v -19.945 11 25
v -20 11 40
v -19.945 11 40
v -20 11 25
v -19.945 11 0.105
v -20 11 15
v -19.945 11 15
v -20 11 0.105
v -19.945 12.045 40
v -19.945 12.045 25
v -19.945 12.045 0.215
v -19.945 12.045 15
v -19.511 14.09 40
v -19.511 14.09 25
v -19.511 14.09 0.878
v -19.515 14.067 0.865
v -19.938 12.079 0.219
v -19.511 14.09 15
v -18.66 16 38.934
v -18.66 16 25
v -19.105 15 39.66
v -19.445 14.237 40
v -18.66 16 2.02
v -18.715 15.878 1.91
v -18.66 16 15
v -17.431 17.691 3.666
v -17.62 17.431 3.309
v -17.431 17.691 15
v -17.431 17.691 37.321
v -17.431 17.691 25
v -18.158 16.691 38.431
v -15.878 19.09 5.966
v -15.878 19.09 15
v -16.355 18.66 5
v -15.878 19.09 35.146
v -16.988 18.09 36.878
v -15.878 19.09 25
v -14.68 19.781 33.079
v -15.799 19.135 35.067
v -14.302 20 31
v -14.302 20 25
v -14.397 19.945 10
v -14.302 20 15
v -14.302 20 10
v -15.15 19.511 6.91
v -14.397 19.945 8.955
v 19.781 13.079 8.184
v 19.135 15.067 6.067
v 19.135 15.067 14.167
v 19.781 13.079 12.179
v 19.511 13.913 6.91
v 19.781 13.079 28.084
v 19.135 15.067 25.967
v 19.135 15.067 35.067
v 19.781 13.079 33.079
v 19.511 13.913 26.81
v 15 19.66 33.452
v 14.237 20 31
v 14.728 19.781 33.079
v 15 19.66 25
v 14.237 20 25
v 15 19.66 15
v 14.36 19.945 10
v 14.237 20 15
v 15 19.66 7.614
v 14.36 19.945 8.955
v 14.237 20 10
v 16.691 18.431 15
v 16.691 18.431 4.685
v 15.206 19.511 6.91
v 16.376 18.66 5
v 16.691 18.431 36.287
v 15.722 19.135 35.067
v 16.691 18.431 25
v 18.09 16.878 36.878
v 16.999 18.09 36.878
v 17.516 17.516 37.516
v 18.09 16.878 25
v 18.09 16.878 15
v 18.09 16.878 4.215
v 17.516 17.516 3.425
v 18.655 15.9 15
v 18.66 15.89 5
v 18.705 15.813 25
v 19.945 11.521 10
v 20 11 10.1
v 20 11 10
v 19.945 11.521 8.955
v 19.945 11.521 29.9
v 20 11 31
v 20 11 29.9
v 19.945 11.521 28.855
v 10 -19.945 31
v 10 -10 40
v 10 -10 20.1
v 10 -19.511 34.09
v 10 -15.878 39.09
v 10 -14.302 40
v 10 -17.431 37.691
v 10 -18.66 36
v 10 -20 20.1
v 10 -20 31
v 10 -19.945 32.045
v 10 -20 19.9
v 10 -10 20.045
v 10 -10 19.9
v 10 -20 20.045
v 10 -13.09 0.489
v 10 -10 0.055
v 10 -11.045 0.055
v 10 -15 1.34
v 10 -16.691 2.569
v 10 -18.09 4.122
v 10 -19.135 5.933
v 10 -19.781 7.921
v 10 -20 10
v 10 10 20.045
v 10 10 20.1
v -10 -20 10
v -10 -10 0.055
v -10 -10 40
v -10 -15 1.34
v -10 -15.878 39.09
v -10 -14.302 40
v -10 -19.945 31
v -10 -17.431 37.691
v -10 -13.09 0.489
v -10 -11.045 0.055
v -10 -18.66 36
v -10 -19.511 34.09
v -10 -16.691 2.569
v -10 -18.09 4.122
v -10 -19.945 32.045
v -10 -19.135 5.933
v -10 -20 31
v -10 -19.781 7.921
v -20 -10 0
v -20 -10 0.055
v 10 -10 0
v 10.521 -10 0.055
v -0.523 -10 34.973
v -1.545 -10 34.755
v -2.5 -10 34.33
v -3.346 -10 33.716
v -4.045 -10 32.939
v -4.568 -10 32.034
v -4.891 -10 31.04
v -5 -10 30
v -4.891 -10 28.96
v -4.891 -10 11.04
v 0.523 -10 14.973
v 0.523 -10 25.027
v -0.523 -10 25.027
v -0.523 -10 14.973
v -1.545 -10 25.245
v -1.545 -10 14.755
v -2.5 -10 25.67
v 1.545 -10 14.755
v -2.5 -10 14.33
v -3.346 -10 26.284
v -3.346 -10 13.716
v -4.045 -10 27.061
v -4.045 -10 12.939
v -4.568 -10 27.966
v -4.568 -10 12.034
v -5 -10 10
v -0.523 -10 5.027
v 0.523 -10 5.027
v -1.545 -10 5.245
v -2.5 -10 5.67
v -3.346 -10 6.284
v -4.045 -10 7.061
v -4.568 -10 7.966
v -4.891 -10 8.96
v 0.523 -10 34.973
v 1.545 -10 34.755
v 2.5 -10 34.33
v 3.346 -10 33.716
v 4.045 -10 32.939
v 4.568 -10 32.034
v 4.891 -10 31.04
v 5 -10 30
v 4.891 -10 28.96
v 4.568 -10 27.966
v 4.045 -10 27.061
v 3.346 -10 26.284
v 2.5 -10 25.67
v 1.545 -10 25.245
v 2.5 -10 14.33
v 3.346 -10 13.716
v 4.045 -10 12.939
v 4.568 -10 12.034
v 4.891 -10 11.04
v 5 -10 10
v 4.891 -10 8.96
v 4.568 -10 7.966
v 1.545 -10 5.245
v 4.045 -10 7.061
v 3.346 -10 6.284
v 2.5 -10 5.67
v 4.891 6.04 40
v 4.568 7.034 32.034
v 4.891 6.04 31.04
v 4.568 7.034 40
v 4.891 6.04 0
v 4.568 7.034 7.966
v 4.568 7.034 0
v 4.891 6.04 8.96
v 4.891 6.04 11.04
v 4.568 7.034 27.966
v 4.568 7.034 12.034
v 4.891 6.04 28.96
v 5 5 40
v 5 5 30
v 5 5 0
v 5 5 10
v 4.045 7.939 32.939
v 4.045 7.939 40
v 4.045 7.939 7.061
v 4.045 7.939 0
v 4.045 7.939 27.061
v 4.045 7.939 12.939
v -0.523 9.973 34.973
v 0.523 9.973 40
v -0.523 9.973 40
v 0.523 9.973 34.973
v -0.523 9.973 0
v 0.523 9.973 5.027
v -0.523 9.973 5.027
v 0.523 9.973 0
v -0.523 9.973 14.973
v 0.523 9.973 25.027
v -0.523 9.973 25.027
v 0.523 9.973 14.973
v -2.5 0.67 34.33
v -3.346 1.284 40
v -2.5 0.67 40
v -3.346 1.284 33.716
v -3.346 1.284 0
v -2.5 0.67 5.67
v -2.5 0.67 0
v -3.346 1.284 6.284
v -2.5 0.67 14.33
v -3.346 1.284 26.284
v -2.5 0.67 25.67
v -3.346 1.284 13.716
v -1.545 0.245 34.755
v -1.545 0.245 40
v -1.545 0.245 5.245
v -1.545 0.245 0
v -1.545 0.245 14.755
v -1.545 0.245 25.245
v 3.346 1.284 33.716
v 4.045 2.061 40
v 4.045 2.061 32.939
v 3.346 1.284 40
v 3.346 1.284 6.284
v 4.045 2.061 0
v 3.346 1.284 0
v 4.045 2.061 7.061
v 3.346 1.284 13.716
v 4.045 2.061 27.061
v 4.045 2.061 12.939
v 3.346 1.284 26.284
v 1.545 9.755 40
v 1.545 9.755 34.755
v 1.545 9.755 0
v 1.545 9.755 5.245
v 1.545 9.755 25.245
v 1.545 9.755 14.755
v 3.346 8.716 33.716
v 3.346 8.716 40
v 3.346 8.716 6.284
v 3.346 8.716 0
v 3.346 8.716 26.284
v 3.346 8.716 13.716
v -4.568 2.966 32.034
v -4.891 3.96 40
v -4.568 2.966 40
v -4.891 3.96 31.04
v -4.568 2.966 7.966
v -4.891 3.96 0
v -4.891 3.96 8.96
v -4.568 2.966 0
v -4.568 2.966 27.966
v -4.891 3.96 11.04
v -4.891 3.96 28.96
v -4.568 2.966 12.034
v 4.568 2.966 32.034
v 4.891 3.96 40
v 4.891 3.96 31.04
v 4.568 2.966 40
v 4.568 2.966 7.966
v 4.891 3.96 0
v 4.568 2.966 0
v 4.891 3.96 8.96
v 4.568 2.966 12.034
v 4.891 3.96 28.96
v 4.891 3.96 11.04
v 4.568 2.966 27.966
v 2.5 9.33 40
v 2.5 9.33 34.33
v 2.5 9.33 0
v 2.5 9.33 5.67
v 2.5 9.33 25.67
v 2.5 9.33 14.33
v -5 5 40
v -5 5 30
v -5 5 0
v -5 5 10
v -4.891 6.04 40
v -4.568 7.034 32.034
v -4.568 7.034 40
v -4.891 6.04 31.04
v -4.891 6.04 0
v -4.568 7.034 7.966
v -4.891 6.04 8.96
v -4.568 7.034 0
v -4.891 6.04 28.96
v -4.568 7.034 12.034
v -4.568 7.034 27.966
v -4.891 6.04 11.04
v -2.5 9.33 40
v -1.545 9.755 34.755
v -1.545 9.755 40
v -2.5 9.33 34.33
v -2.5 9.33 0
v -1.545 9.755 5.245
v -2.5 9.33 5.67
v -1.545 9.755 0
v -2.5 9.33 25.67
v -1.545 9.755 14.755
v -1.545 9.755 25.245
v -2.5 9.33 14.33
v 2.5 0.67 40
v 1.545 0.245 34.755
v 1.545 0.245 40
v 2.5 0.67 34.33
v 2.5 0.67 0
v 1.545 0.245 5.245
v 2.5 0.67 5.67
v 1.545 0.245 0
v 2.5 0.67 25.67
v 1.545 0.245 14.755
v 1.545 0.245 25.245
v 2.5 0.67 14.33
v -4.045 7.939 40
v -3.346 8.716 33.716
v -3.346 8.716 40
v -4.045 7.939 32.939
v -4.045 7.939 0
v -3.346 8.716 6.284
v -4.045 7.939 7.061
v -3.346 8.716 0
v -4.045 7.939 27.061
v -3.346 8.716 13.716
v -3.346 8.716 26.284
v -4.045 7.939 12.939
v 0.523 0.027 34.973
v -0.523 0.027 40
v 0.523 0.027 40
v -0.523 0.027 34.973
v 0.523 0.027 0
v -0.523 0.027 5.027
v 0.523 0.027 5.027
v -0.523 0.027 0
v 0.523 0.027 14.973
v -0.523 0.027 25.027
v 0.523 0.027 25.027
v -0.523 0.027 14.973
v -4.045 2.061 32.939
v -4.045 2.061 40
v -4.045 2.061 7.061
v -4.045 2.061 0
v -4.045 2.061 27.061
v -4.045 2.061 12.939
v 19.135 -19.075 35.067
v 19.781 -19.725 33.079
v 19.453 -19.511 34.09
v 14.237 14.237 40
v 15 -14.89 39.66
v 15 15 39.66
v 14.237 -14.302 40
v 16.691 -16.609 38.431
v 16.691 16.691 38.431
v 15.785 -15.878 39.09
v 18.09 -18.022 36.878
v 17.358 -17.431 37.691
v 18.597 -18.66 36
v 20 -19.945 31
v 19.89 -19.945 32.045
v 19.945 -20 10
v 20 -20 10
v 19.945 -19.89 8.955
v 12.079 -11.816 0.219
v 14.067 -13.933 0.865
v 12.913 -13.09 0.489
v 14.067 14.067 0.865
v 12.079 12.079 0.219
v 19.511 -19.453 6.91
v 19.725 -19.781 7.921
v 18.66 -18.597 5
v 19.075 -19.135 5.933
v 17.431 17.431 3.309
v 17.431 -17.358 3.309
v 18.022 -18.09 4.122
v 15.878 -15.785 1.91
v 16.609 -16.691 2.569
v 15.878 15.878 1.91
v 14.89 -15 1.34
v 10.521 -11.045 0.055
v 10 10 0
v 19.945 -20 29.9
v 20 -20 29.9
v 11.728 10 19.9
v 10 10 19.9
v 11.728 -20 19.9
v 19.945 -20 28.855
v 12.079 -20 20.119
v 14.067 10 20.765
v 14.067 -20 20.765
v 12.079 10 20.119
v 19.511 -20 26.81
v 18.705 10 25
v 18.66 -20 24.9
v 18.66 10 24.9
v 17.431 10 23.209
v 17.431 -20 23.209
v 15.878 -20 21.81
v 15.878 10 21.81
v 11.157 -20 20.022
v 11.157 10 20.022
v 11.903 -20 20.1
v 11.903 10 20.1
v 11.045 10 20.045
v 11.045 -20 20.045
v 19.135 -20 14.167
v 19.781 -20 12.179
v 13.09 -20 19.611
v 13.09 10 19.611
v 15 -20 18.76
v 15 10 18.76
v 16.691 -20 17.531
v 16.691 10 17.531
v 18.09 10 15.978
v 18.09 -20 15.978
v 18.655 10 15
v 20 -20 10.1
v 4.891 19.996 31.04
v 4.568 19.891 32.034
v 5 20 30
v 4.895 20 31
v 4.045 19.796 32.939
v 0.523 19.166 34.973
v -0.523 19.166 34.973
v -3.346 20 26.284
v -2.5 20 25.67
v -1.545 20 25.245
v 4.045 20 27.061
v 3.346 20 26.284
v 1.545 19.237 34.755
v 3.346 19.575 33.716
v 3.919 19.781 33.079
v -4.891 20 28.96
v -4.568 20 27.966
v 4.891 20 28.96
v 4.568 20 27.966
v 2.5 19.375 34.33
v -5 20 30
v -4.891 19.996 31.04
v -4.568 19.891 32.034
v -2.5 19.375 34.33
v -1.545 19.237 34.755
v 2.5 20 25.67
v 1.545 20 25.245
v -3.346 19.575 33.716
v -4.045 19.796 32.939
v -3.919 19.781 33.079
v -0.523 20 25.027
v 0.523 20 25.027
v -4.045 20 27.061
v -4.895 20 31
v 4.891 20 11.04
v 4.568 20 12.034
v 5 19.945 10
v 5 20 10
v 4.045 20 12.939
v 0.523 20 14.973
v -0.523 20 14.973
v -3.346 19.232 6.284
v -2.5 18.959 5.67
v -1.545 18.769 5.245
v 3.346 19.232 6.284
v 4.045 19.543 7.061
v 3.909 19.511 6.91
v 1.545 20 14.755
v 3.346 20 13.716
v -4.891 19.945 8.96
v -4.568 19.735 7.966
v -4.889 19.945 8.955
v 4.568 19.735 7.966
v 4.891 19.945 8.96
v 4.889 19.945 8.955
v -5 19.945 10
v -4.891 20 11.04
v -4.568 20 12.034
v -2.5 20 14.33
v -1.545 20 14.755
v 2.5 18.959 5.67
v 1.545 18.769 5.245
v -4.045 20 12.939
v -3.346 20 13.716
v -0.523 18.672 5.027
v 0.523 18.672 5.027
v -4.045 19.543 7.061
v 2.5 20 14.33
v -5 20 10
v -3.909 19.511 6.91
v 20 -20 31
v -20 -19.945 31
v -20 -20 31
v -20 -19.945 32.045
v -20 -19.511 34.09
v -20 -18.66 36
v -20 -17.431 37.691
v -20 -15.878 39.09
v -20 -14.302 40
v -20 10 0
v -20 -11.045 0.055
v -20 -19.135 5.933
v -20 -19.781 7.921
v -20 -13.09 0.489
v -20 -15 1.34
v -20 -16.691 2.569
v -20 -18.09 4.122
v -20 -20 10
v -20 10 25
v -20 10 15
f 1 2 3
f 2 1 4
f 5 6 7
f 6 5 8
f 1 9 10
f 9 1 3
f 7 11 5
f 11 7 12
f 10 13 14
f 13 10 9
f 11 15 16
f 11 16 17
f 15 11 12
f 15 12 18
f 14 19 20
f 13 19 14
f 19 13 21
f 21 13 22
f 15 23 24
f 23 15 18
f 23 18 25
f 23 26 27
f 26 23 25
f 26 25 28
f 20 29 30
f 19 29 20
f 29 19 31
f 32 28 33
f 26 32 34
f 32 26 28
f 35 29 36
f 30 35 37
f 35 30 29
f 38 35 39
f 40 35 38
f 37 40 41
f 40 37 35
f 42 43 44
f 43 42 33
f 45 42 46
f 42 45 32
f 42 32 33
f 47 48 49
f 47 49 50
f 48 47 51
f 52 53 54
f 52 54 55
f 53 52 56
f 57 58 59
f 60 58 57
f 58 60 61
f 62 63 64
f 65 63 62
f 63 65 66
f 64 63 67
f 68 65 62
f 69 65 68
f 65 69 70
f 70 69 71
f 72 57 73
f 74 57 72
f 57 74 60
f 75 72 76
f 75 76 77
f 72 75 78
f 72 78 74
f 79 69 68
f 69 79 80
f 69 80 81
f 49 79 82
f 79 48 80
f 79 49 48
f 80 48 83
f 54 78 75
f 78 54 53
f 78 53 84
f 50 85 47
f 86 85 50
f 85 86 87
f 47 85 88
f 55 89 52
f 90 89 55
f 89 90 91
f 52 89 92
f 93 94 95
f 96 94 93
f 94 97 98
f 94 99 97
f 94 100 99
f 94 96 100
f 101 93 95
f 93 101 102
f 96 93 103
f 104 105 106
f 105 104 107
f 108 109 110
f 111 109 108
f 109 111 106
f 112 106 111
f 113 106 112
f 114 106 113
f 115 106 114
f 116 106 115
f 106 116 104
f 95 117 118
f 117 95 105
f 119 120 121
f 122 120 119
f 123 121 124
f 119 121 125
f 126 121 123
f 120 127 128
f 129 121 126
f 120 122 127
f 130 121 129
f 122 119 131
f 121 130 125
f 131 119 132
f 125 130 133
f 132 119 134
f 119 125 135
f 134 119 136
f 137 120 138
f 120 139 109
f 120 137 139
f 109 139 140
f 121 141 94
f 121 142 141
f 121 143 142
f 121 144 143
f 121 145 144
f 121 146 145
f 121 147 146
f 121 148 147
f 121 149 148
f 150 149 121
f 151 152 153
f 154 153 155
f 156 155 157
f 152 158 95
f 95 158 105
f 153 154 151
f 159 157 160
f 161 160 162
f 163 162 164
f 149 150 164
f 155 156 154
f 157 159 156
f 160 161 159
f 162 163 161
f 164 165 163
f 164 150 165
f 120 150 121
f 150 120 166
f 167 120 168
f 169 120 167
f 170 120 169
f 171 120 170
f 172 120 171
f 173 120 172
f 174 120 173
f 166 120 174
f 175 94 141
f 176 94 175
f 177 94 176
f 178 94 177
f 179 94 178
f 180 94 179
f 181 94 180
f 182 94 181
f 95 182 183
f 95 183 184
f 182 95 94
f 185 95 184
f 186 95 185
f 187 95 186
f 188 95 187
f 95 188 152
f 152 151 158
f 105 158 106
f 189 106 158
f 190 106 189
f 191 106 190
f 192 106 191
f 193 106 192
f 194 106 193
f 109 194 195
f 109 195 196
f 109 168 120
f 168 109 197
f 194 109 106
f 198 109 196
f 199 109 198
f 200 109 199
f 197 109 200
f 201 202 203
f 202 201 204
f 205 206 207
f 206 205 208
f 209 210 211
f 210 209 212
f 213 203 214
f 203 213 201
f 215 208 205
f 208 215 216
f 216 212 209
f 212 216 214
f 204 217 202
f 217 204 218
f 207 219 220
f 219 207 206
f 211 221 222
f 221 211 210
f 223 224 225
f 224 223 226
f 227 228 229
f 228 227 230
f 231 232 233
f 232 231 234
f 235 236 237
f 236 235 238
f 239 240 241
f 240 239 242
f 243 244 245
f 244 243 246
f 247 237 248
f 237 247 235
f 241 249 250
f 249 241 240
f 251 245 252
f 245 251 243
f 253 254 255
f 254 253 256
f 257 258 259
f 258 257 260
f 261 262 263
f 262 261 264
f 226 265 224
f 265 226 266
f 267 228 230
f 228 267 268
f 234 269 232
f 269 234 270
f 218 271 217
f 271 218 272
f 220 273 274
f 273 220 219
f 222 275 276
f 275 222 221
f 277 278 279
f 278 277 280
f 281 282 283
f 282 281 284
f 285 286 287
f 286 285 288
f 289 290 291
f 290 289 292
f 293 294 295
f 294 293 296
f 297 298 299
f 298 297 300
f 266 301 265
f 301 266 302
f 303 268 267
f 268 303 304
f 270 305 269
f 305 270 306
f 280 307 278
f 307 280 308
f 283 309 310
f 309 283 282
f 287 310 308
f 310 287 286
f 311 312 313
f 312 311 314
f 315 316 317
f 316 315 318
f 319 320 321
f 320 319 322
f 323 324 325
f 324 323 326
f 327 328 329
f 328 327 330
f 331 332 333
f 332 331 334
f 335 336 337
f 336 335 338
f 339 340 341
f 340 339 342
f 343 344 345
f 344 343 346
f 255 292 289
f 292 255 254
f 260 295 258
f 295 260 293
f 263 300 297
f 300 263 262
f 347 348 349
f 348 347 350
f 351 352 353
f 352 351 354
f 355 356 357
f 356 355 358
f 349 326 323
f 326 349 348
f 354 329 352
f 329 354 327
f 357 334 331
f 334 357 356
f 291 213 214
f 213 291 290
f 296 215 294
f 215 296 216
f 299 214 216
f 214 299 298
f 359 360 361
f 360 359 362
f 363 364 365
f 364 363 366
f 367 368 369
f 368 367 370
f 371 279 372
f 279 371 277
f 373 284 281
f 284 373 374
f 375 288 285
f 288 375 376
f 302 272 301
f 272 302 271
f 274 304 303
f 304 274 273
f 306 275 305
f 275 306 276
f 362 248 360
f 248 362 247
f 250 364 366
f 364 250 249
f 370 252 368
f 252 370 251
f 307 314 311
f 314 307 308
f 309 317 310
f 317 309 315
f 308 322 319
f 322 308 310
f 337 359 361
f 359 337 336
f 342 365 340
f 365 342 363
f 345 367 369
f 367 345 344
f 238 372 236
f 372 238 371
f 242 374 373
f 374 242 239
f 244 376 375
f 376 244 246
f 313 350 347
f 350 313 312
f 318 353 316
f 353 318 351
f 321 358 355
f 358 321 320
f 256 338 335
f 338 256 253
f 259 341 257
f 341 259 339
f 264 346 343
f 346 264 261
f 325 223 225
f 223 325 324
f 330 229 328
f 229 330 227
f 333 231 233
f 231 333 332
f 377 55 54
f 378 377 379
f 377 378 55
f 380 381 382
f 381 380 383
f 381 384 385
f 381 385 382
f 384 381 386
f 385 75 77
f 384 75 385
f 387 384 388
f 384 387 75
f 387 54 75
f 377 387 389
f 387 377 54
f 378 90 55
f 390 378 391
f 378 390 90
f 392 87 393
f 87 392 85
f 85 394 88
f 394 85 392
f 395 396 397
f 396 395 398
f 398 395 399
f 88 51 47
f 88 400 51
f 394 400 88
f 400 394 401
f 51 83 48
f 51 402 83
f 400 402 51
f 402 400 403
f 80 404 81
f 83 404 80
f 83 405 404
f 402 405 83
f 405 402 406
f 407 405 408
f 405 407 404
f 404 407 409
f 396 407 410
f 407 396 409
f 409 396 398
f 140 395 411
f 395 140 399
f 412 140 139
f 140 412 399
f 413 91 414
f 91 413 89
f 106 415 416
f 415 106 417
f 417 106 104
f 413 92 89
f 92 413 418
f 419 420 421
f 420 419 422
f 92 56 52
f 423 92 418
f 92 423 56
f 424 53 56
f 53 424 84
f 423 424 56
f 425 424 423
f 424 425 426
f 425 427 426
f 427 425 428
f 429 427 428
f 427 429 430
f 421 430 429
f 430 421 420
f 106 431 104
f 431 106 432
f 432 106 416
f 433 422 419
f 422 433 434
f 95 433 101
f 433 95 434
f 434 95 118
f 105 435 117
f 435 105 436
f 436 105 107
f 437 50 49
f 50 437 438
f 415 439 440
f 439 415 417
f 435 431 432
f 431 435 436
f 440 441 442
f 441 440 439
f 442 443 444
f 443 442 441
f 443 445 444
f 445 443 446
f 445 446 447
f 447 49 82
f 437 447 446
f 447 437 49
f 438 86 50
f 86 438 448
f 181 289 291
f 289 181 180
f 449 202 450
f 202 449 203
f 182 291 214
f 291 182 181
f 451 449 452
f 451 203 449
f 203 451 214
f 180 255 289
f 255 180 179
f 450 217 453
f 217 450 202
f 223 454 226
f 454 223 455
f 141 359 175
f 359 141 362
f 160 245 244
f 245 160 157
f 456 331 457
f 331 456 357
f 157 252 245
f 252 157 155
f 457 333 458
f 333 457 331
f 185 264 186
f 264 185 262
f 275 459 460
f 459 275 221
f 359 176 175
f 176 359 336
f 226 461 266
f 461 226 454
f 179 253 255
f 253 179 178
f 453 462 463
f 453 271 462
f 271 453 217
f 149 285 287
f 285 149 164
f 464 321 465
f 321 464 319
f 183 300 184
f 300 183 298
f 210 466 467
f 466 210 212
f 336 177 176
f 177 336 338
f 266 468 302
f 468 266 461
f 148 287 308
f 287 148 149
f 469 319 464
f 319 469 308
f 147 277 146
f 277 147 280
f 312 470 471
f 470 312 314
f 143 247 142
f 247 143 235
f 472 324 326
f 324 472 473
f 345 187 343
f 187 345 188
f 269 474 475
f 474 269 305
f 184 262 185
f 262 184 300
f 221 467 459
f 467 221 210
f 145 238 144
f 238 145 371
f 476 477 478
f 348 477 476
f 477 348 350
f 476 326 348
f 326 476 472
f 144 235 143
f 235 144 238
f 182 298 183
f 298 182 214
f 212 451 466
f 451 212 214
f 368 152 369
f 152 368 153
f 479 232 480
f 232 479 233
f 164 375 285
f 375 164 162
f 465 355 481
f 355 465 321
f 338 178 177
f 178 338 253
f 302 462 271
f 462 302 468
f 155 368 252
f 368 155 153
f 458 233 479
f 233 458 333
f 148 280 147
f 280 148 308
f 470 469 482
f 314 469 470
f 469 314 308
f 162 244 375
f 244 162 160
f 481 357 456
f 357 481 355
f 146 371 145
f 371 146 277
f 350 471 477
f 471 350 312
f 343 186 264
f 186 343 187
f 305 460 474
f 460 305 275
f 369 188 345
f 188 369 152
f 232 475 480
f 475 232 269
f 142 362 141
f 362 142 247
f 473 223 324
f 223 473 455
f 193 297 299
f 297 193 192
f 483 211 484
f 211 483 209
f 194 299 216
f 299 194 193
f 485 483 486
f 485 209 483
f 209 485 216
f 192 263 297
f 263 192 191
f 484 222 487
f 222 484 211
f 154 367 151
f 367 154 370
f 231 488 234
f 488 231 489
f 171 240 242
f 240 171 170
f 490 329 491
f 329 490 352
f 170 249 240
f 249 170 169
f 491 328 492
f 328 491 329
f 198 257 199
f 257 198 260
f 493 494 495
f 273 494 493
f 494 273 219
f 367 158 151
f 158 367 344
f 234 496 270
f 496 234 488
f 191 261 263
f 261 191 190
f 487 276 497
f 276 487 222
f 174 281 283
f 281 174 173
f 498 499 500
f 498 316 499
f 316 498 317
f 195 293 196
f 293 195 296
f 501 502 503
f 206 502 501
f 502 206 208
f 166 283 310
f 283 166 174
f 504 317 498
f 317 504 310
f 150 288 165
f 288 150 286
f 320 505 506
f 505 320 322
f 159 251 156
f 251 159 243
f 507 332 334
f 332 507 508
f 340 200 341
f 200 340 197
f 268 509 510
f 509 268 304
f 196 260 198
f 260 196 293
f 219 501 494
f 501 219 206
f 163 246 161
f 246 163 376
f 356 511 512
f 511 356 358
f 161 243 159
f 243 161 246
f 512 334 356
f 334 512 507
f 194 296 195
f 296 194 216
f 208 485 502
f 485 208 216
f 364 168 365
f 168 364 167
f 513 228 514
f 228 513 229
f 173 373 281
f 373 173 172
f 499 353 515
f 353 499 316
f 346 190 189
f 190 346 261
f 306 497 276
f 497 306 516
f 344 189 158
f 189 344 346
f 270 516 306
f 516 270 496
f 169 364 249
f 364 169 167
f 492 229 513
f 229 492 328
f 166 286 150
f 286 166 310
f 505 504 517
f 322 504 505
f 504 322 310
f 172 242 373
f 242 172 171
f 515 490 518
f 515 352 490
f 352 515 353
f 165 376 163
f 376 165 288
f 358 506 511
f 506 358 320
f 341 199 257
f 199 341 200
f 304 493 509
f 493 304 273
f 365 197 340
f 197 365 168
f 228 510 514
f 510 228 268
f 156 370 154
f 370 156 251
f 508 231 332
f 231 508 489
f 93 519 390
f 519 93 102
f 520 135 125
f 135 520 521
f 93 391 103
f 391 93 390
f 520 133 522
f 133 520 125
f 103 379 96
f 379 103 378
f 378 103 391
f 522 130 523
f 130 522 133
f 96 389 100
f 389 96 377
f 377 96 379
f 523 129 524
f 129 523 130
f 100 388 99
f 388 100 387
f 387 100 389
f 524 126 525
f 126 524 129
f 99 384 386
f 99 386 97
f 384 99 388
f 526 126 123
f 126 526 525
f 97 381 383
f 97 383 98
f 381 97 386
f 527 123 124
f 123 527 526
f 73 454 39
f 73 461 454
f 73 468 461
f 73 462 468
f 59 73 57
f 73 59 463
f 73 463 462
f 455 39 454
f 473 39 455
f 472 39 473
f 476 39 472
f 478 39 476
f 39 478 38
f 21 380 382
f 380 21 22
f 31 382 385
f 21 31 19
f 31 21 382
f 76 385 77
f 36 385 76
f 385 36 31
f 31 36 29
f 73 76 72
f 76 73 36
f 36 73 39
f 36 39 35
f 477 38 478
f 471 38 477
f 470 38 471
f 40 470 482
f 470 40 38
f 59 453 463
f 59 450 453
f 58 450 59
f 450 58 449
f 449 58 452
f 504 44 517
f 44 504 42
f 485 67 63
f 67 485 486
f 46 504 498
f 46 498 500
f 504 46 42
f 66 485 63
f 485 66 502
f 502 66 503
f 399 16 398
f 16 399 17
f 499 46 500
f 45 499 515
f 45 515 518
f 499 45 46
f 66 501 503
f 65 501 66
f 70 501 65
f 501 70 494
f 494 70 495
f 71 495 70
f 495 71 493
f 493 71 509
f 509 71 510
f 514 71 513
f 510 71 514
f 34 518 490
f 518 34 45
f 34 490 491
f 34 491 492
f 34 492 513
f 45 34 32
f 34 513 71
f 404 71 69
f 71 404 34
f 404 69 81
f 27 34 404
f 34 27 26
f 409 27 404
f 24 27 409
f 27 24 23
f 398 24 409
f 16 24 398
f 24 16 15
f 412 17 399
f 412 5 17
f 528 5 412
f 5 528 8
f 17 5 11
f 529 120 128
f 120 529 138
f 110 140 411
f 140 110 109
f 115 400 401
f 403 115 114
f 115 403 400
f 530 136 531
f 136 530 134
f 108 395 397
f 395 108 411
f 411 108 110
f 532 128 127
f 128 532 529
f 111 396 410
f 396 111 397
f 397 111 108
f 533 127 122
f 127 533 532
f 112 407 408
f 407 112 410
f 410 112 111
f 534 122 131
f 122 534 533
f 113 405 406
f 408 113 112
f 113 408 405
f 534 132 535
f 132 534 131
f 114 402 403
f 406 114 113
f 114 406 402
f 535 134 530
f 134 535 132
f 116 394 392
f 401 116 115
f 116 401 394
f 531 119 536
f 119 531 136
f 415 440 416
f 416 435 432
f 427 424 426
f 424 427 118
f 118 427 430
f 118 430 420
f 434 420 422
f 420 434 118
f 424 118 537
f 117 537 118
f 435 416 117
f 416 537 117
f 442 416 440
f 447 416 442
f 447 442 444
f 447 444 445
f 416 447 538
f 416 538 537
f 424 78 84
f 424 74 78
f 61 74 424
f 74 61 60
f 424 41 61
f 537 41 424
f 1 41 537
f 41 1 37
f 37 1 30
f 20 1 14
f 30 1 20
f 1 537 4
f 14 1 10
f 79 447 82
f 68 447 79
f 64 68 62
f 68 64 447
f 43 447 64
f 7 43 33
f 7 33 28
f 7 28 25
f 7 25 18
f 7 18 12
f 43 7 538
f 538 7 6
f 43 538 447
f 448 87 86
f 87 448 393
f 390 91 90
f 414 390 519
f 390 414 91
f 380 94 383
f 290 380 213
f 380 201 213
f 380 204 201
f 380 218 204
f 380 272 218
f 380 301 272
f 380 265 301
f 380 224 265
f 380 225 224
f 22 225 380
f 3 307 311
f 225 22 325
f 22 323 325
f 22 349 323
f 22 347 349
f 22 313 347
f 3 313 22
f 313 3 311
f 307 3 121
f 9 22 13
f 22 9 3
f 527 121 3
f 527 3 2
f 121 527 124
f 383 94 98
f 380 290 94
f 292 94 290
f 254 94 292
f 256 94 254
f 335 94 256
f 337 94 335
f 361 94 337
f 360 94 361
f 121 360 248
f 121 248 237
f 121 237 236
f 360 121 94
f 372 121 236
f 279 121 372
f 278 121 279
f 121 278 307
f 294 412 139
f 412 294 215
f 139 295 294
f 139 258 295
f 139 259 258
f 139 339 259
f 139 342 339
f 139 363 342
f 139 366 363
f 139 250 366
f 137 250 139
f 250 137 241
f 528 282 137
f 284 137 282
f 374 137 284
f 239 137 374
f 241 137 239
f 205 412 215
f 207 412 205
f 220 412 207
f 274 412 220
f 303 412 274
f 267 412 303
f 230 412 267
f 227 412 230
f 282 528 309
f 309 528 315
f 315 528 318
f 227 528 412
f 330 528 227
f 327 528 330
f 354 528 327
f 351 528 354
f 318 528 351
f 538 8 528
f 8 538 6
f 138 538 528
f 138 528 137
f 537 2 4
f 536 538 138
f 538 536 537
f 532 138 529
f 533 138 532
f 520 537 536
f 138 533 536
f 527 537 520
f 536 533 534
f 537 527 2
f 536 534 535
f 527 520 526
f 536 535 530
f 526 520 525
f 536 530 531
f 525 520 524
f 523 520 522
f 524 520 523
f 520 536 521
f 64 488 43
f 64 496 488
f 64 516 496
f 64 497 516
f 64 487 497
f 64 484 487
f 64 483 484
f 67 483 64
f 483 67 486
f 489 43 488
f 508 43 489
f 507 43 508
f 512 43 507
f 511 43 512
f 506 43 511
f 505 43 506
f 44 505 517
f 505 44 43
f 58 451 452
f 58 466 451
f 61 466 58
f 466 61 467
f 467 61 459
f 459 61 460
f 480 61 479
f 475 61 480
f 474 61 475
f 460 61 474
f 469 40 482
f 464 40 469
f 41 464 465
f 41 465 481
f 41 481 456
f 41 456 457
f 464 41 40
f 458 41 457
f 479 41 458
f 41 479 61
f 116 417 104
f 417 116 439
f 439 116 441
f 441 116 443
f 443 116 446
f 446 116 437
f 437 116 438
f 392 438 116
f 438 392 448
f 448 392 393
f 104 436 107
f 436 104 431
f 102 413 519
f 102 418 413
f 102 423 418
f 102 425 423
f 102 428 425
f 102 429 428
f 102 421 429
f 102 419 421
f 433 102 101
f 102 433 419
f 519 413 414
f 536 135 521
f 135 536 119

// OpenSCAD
// [FL_INDEX: keywords="openscad, 3d_parametric, Customizable_Monogram_Cube, csg_solid" | COT="Parametric OpenSCAD design from 3DCodeverse"]
// Title: Customizable Monogram Cube

// Monogram Cube
// v 1.1
// Inspired by the cover art of Douglas Hofstadter's "Godel, Escher, Bach"
//
// (C) Copyright 2013, Brian Enigma, some rights reserved.
//
// Monogram Cube by Brian Enigma is licensed under a Creative Commons 
// Attribution-ShareAlike 3.0 Unported License.
//
// - http://netninja.com
// - http://www.thingiverse.com/BrianEnigma

// Note that certain letter combinations don't work well, especially with the "alternate" typeface.

SIZE = 40 * 1;
DETAIL = 30 * 1;

// The typeface to use.  "Blocks" yields better results, but is more stylistic and block-like.  It reminds me of some display typefaces from the 20s and 30s. It has smaller overhangs and is easier to print.  "Alternate" results in more consistently letter-like, less stylized results, but has more overhangs and is harder to print.
typeface = "blocks";     // [blocks, alternate]

top_letter = "A";        // [A,B,C,D,E,F,G,H,I,J,K,L,M,N,O,P,Q,R,S,T,U,V,W,X,Y,Z,None]
left_side_letter = "B";  // [A,B,C,D,E,F,G,H,I,J,K,L,M,N,O,P,Q,R,S,T,U,V,W,X,Y,Z,None]
right_side_letter = "C"; // [A,B,C,D,E,F,G,H,I,J,K,L,M,N,O,P,Q,R,S,T,U,V,W,X,Y,Z,None]


//include <letters.scad>

// ----------------------------------------
// Monogram Cube
// v 1.1
// Inspired by the cover art of Douglas Hofstadter's "Godel, Escher, Bach"
//
// (C) Copyright 2013, Brian Enigma, some rights reserved.
//
// Monogram Cube by Brian Enigma is licensed under a Creative Commons 
// Attribution-ShareAlike 3.0 Unported License.
//
// - http://netninja.com
// - http://www.thingiverse.com/BrianEnigma

// arc() builds a lower-left corner arc by default
// +
// |\
// |  \
// |    \
// +------+
module arc(cubeSize, rotation, x, y)
{
    translate(v = [(cubeSize / 4 + 1) / 2 + x, (cubeSize / 4 + 1) / 2 + y, (cubeSize + 2) / 2 - 1])
		rotate(a = [0, 0, -1 * rotation])
		    translate(v = [(cubeSize / 4 + 1) / -2, (cubeSize / 4 + 1) / -2, (cubeSize + 2) / -2])
		        difference()
		        {
		            cube(size = [cubeSize / 4 + 1, cubeSize / 4 + 1, cubeSize + 2]);
		            translate(v = [cubeSize / 4 + 1, cubeSize / 4 + 1, 0])
		                cylinder(r = cubeSize / 4, h = cubeSize + 2, $fn = DETAIL);
		        }
}

module arcWithMargin(cubeSize, rotation, marginX, marginY, x, y)
{
	if (90 == rotation || 270 == rotation)
	{
	    translate(v = [(cubeSize / 4 + marginY) / 2 + x, (cubeSize / 4 + marginX) / 2 + y, (cubeSize + 2) / 2 - 1])
			rotate(a = [0, 0, -1 * rotation])
			    translate(v = [(cubeSize / 4 + marginX) / -2, (cubeSize / 4 + marginY) / -2, (cubeSize + 2) / -2])
			        difference()
			        {
			            cube(size = [cubeSize / 4 + marginX, cubeSize / 4 + marginY, cubeSize + 2]);
			            translate(v = [cubeSize / 4 + marginX, cubeSize / 4 + marginY, 0])
			                cylinder(r = cubeSize / 4, h = cubeSize + 2, $fn = DETAIL);
			        }
	} else {
	    translate(v = [(cubeSize / 4 + marginX) / 2 + x, (cubeSize / 4 + marginY) / 2 + y, (cubeSize + 2) / 2 - 1])
			rotate(a = [0, 0, -1 * rotation])
			    translate(v = [(cubeSize / 4 + marginX) / -2, (cubeSize / 4 + marginY) / -2, (cubeSize + 2) / -2])
			        difference()
			        {
			            cube(size = [cubeSize / 4 + marginX, cubeSize / 4 + marginY, cubeSize + 2]);
			            translate(v = [cubeSize / 4 + marginX, cubeSize / 4 + marginY, 0])
			                cylinder(r = cubeSize / 4, h = cubeSize + 2, $fn = DETAIL);
			        }
	}
}

module carveLetterA(cubeSize)
{
    // lower cut-out
    translate(v = [cubeSize / 4, -1, -1])
        cube(size = [cubeSize / 2, cubeSize / 4 + 1, cubeSize + 2]);
    // center hole
    translate(v = [cubeSize / 2, cubeSize * 5 / 8, -1])
        cylinder(r = cubeSize / 8, h = cubeSize + 2, $fn = DETAIL);
    // top left corner curve
	arc(cubeSize, 90, -1, cubeSize * 3 / 4 + 1);
    // top right corner curve
	arc(cubeSize, 180, cubeSize * 3 / 4, cubeSize * 3 / 4 + 1);
}

module carveLetterB(cubeSize)
{
    // center holes
    translate(v = [cubeSize / 2, cubeSize * 3 / 4, -1])
        cylinder(r = cubeSize / 8, h = cubeSize + 2, $fn = DETAIL);
    translate(v = [cubeSize / 2, cubeSize * 1 / 4, -1])
        cylinder(r = cubeSize / 8, h = cubeSize + 2, $fn = DETAIL);
    // top right corner curve
	arc(cubeSize, 180, cubeSize * 3 / 4, cubeSize * 3 / 4 + 1);
    // bottom right corner curve
	arc(cubeSize, 270, cubeSize * 3 / 4, -1);
    // edge divot
	arcWithMargin(cubeSize, 270, 0, 5, cubeSize * 3 / 4, cubeSize / 2 - 0.1); // upper
	arcWithMargin(cubeSize, 180, 5, 0, cubeSize * 3 / 4, cubeSize / 4 + 0.1); // lower
}

module carveLetterC(cubeSize)
{
    // top left corner curve
	arc(cubeSize, 90, -1, cubeSize * 3 / 4 + 1);
    // top right corner curve
	arc(cubeSize, 180, cubeSize * 3 / 4, cubeSize * 3 / 4 + 1);
    // bottom right corner curve
	arc(cubeSize, 270, cubeSize * 3 / 4, -1);
    // bottom left corner curve
	arc(cubeSize, 0, -1, -1);
	// Cutout
    translate(v = [cubeSize * 3 / 4, cubeSize * 3 / 8, -1])
		cube(size = [cubeSize / 4 + 1, cubeSize / 4, cubeSize + 2]);
}

module carveLetterCAlt(cubeSize)
{
    // top left corner curve
	arc(cubeSize, 90, -1, cubeSize * 3 / 4 + 1);
    // top right corner curve
	arc(cubeSize, 180, cubeSize * 3 / 4, cubeSize * 3 / 4 + 1);
    // bottom right corner curve
	arc(cubeSize, 270, cubeSize * 3 / 4, -1);
    // bottom left corner curve
	arc(cubeSize, 0, -1, -1);
	// Cutout
	translate(v = [cubeSize / 2, cubeSize / 2, -1])
		cylinder(r = cubeSize / 4, h = cubeSize + 2, $fn = DETAIL);
    translate(v = [cubeSize / 2, cubeSize / 4, -1])
		cube(size = [cubeSize / 2 + 1, cubeSize / 2, cubeSize + 2]);
}

module carveLetterD(cubeSize)
{
    // center hole
    translate(v = [cubeSize / 2, cubeSize / 2, -1])
        cylinder(r = cubeSize / 8, h = cubeSize + 2, $fn = DETAIL);
    // top right corner curve
	arc(cubeSize, 180, cubeSize * 3 / 4, cubeSize * 3 / 4 + 1);
    // bottom right corner curve
	arc(cubeSize, 270, cubeSize * 3 / 4, -1);
}

module carveLetterDAlt(cubeSize)
{
    // top right corner curve
	arc(cubeSize, 180, cubeSize * 3 / 4, cubeSize * 3 / 4 + 1);
    // bottom right corner curve
	arc(cubeSize, 270, cubeSize * 3 / 4, -1);
	// Cutout
	translate(v = [cubeSize / 2, cubeSize / 2, -1])
		cylinder(r = cubeSize / 4, h = cubeSize + 2, $fn = DETAIL);
    translate(v = [cubeSize / 4, cubeSize / 4, -1])
		cube(size = [cubeSize / 4, cubeSize / 2, cubeSize + 2]);
}

module carveLetterE(cubeSize)
{
    // upper cut-out
    translate(v = [cubeSize * 3 / 4, cubeSize * 5 / 8, -1])
        cube(size = [cubeSize / 4 + 1, cubeSize / 8, cubeSize + 2]);
    // lower cut-out
    translate(v = [cubeSize * 3 / 4, cubeSize / 4, -1])
        cube(size = [cubeSize / 4 + 1, cubeSize / 8, cubeSize + 2]);
}

module carveLetterEAlt(cubeSize)
{
    // upper cut-out
    translate(v = [cubeSize / 4, cubeSize * 5 / 8, -1])
        cube(size = [cubeSize * 3 / 4 + 1, cubeSize / 8, cubeSize + 2]);
    // lower cut-out
    translate(v = [cubeSize / 4, cubeSize  / 4, -1])
        cube(size = [cubeSize * 3 / 4 + 1, cubeSize / 8, cubeSize + 2]);
	// middle prong
    translate(v = [cubeSize * 5 / 8, cubeSize * 3 / 8 - 1, -1])
        cube(size = [cubeSize / 2, cubeSize / 4 + 2, cubeSize + 2]);
}

module carveLetterF(cubeSize)
{
	// Upper cutout
    translate(v = [cubeSize * 3 / 4, cubeSize / 2, -1])
		cube(size = [cubeSize / 4 + 1, cubeSize / 4, cubeSize + 2]);
	// Lower cutout
    translate(v = [cubeSize * 3 / 4, -1, -1])
		cube(size = [cubeSize / 4 + 1, cubeSize / 4 + 1, cubeSize + 2]);
}

module carveLetterFAlt(cubeSize)
{
	// Upper cutout
    translate(v = [cubeSize / 4, cubeSize / 2, -1])
		cube(size = [cubeSize * 3/ 4 + 1, cubeSize / 4, cubeSize + 2]);
	// Lower cutout
    translate(v = [cubeSize / 4, -1, -1])
		cube(size = [cubeSize * 3 / 4 + 1, cubeSize / 4 + 1, cubeSize + 2]);
    translate(v = [cubeSize * 5 / 8, cubeSize / 4 - 1, -1])
        cube(size = [cubeSize / 2, cubeSize / 4 + 2, cubeSize + 2]);
}

module carveLetterG(cubeSize)
{
    // top left corner curve
	arc(cubeSize, 90, -1, cubeSize * 3 / 4 + 1);
    // top right corner curve
	arc(cubeSize, 180, cubeSize * 3 / 4, cubeSize * 3 / 4 + 1);
    // bottom left corner curve
	arc(cubeSize, 0, -1, -1);
	// Cutout
    translate(v = [cubeSize * 3 / 4, cubeSize * 3 / 8, -1])
		cube(size = [cubeSize / 4 + 1, cubeSize / 4, cubeSize + 2]);
}

module carveLetterGAlt(cubeSize)
{
    // top left corner curve
	arc(cubeSize, 90, -1, cubeSize * 3 / 4 + 1);
    // top right corner curve
	arc(cubeSize, 180, cubeSize * 3 / 4, cubeSize * 3 / 4 + 1);
    // bottom left corner curve
	arc(cubeSize, 0, -1, -1);
	// Cutout
	translate(v = [cubeSize / 2, cubeSize / 2, -1])
		cylinder(r = cubeSize / 4, h = cubeSize + 2, $fn = DETAIL);
    translate(v = [cubeSize / 2, cubeSize / 2, -1])
		cube(size = [cubeSize / 2 + 1, cubeSize / 4, cubeSize + 2]);
    translate(v = [cubeSize / 2, cubeSize / 4, -1])
		cube(size = [cubeSize / 4, cubeSize / 4 + 1, cubeSize + 2]);
}

module carveLetterH(cubeSize)
{
    // lower cut-out
    translate(v = [cubeSize / 4, -1, -1])
        cube(size = [cubeSize / 2, cubeSize / 4 + 1, cubeSize + 2]);
    // upper cut-out
    translate(v = [cubeSize / 4, cubeSize * 3 / 4, -1])
        cube(size = [cubeSize / 2, cubeSize / 4 + 1, cubeSize + 2]);
}

module carveLetterHAlt(cubeSize)
{
    // lower cut-out
    translate(v = [cubeSize / 4, -1, -1])
        cube(size = [cubeSize / 2, cubeSize * 3 / 8 + 1, cubeSize + 2]);
    // upper cut-out
    translate(v = [cubeSize / 4, cubeSize * 5 / 8, -1])
        cube(size = [cubeSize / 2, cubeSize * 3 / 8 + 1, cubeSize + 2]);
}

module carveLetterI(cubeSize)
{
    // left cut-out
    translate(v = [-1, cubeSize / 4, -1])
        cube(size = [cubeSize / 4 + 1, cubeSize / 2, cubeSize + 2]);
    // right cut-out
    translate(v = [cubeSize * 3 / 4, cubeSize / 4, -1])
        cube(size = [ cubeSize / 4 + 1, cubeSize / 2,cubeSize + 2]);
}

module carveLetterIAlt(cubeSize)
{
    // left cut-out
    translate(v = [-1, cubeSize / 4, -1])
        cube(size = [cubeSize * 3 / 8 + 1, cubeSize / 2, cubeSize + 2]);
    // right cut-out
    translate(v = [cubeSize * 5 / 8, cubeSize / 4, -1])
        cube(size = [ cubeSize * 3 / 8 + 1, cubeSize / 2,cubeSize + 2]);
}

module carveLetterJ(cubeSize)
{
    //// top right corner curve
	//arc(cubeSize, 180, cubeSize * 3 / 4, cubeSize * 3 / 4 + 1);
    // bottom right corner curve
	arc(cubeSize, 270, cubeSize * 3 / 4, -1);
    // bottom left corner curve
	arc(cubeSize, 0, -1, -1);
	// Cutout
    translate(v = [-1, cubeSize / 2, -1])
		cube(size = [cubeSize / 4 + 1, cubeSize / 2 + 1, cubeSize + 2]);
}

module carveLetterJAlt(cubeSize)
{
    // bottom right corner curve
	arc(cubeSize, 270, cubeSize * 3 / 4, -1);
    // bottom left corner curve
	arc(cubeSize, 0, -1, -1);
	// Cutout
	translate(v = [cubeSize / 2, cubeSize / 2, -1])
		cylinder(r = cubeSize / 4, h = cubeSize + 2, $fn = DETAIL);
    translate(v = [-1, cubeSize / 2, -1])
		cube(size = [cubeSize * 3 / 4 + 1, cubeSize / 2 + 1, cubeSize + 2]);
}

module carveLetterK(cubeSize)
{
	// Upper leg
	translate(v = [cubeSize / 2, cubeSize, -1])
		cylinder(r = cubeSize / 4, h = cubeSize + 2, $fn = DETAIL);
	translate(v = [cubeSize / 4, cubeSize * 3 / 4, -1])
		cube(size = [cubeSize / 4, cubeSize / 4 + 1, cubeSize + 2]);
	// Lower leg
	translate(v = [cubeSize / 2, 0, -1])
		cylinder(r = cubeSize / 4, h = cubeSize + 2, $fn = DETAIL);
	translate(v = [cubeSize / 4, -1, -1])
		cube(size = [cubeSize / 4, cubeSize / 4 + 1, cubeSize + 2]);
    // edge divot
	arc(cubeSize, 270, cubeSize * 3 / 4, cubeSize / 2); // upper
	arc(cubeSize, 180, cubeSize * 3 / 4, cubeSize / 4); // lower
	
}

module carveLetterKAlt(cubeSize)
{
	// Upper leg
	translate(v = [cubeSize / 2, cubeSize * 7 / 8, -1])
		cylinder(r = cubeSize / 4, h = cubeSize + 2, $fn = DETAIL);
	translate(v = [cubeSize / 4, cubeSize * 5 / 8, -1])
		cube(size = [cubeSize / 4, cubeSize / 2, cubeSize + 2]);
	translate(v = [cubeSize / 2 - 1, cubeSize * 7 / 8, -1])
		cube(size = [cubeSize / 4 + 1, cubeSize / 4, cubeSize + 2]);
	// Lower leg
	translate(v = [cubeSize / 2, cubeSize / 8, -1])
		cylinder(r = cubeSize / 4, h = cubeSize + 2, $fn = DETAIL);
	translate(v = [cubeSize / 4, -1, -1])
		cube(size = [cubeSize / 4, cubeSize * 3 / 8 + 1, cubeSize + 2]);
	translate(v = [cubeSize / 2 - 1, -1, -1])
		cube(size = [cubeSize / 4 + 1, cubeSize / 8 + 1, cubeSize + 2]);
    // edge divot
	arc(cubeSize, 270, cubeSize * 3 / 4, cubeSize / 2); // upper
	arc(cubeSize, 180, cubeSize * 3 / 4, cubeSize / 4); // lower
	
}

module carveLetterL(cubeSize)
{
	// Cutout
    translate(v = [cubeSize * 3 / 4, cubeSize / 2, -1])
		cube(size = [cubeSize / 4 + 1, cubeSize / 2 + 1, cubeSize + 2]);
}

module carveLetterLAlt(cubeSize)
{
	// Cutout
    translate(v = [cubeSize / 4, cubeSize / 4, -1])
		cube(size = [cubeSize * 4 / 4 + 1, cubeSize * 3 / 4 + 1, cubeSize + 2]);
}

module carveLetterM(cubeSize)
{
    // top left corner curve
	arc(cubeSize, 90, -1, cubeSize * 3 / 4 + 1);
    // top right corner curve
	arc(cubeSize, 180, cubeSize * 3 / 4, cubeSize * 3 / 4 + 1);
    // divot
	arcWithMargin(cubeSize, 180, 0.1, 5, cubeSize / 4 + 0.1, cubeSize * 3 / 4); // left
	arcWithMargin(cubeSize,  90, 5, 0.1, cubeSize / 2 - 0.1, cubeSize * 3 / 4); // right
	// Cutouts
    translate(v = [cubeSize / 4, -1, -1])
		cube(size = [cubeSize / 8, cubeSize / 4 + 1, cubeSize + 2]);
    translate(v = [cubeSize * 5 / 8, -1, -1])
		cube(size = [cubeSize / 8, cubeSize / 4 + 1, cubeSize + 2]);
}

module carveLetterN(cubeSize)
{
    // top
	arcWithMargin(cubeSize, 180, 0, 5, cubeSize * 3 / 8, cubeSize * 3 / 4);
	// bottom
	arcWithMargin(cubeSize,   0, 0, 5, cubeSize * 3 / 8, -5);
}

module carveLetterO(cubeSize)
{
    // top left corner curve
	arc(cubeSize, 90, -1, cubeSize * 3 / 4 + 1);
    // top right corner curve
	arc(cubeSize, 180, cubeSize * 3 / 4, cubeSize * 3 / 4 + 1);
    // bottom right corner curve
	arc(cubeSize, 270, cubeSize * 3 / 4, -1);
    // bottom left corner curve
	arc(cubeSize, 0, -1, -1);
	// Cutout
    translate(v = [cubeSize / 2, cubeSize / 2, -1])
		cylinder(r = cubeSize / 8, h = cubeSize + 2,$fn = DETAIL);
}

module carveLetterOAlt(cubeSize)
{
    // top left corner curve
	arc(cubeSize, 90, -1, cubeSize * 3 / 4 + 1);
    // top right corner curve
	arc(cubeSize, 180, cubeSize * 3 / 4, cubeSize * 3 / 4 + 1);
    // bottom right corner curve
	arc(cubeSize, 270, cubeSize * 3 / 4, -1);
    // bottom left corner curve
	arc(cubeSize, 0, -1, -1);
	// Cutout
    translate(v = [cubeSize / 2, cubeSize / 2, -1])
		cylinder(r = cubeSize / 4, h = cubeSize + 2,$fn = DETAIL);
}

module carveLetterP(cubeSize)
{
    // center holes
    translate(v = [cubeSize / 2, cubeSize * 3 / 4, -1])
        cylinder(r = cubeSize / 8, h = cubeSize + 2, $fn = DETAIL);
    // top right corner curve
	arc(cubeSize, 180, cubeSize * 3 / 4, cubeSize * 3 / 4 + 1);
	arcWithMargin(cubeSize, 270, 5, 5, cubeSize * 3 / 4, cubeSize / 2 - 5);
	// cuout
	translate(v = [cubeSize * 3 / 4, -1, -1])
		cube(size = [cubeSize / 4 + 1, cubeSize / 2 + 1, cubeSize + 2]);
}

module carveLetterPAlt(cubeSize)
{
    // center holes
    translate(v = [cubeSize / 2, cubeSize * 3 / 4, -1])
        cylinder(r = cubeSize / 8, h = cubeSize + 2, $fn = DETAIL);
    // top right corner curve
	arc(cubeSize, 180, cubeSize * 3 / 4, cubeSize * 3 / 4 + 1);
	arcWithMargin(cubeSize, 270, 5, 5, cubeSize * 3 / 4, cubeSize / 2 - 5);
	// cuout
	translate(v = [cubeSize / 2, -1, -1])
		cube(size = [cubeSize / 2 + 1, cubeSize / 2 + 1, cubeSize + 2]);
}

module carveLetterQ(cubeSize)
{
    // top left corner curve
	arc(cubeSize, 90, -1, cubeSize * 3 / 4 + 1);
    // top right corner curve
	arc(cubeSize, 180, cubeSize * 3 / 4, cubeSize * 3 / 4 + 1);
    // bottom left corner curve
	arc(cubeSize, 0, -1, -1);
	// Cutout
    translate(v = [cubeSize / 2, cubeSize / 2, -1])
		cylinder(r = cubeSize / 8, h = cubeSize + 2,$fn = DETAIL);
}

module carveLetterR(cubeSize)
{
    // center holes
    translate(v = [cubeSize / 2, cubeSize * 3 / 4, -1])
        cylinder(r = cubeSize / 8, h = cubeSize + 2, $fn = DETAIL);
    // top right corner curve
	arc(cubeSize, 180, cubeSize * 3 / 4, cubeSize * 3 / 4 + 1);
	arcWithMargin(cubeSize, 270, 0, 5, cubeSize * 3 / 4, cubeSize / 2 - 0.1); // upper
	arcWithMargin(cubeSize, 180, 5, 0, cubeSize * 3 / 4, cubeSize / 4 + 0.1); // lower
	// cuout
	translate(v = [cubeSize / 2, 0, -1])
		cylinder(r = cubeSize / 4, h = cubeSize + 2, $fn = DETAIL);
	translate(v = [cubeSize / 4, -1, -1])
		cube(size = [cubeSize / 4, cubeSize / 4 + 1, cubeSize + 2]);
}

module carveLetterS(cubeSize)
{
    // top left corner curve
	arc(cubeSize, 90, -1, cubeSize * 3 / 4 + 1);
    // bottom right corner curve
	arc(cubeSize, 270, cubeSize * 3 / 4, -1);
    // left
	arcWithMargin(cubeSize,   0, 5, 0, -5, cubeSize * 3 / 8);
	// right
	arcWithMargin(cubeSize, 180, 5, 0, cubeSize * 3 / 4, cubeSize * 3 / 8);
}

module carveLetterT(cubeSize)
{
	translate(v = [-1, -1, -1])
		cube(size = [cubeSize / 4 + 1, cubeSize * 5 / 8 + 1, cubeSize + 2]);
	translate(v = [cubeSize * 3 / 4, -1, -1])
		cube(size = [cubeSize / 4 + 1, cubeSize * 5 / 8 + 1, cubeSize + 2]);
}

module carveLetterU(cubeSize)
{
    // bottom right corner curve
	arc(cubeSize, 270, cubeSize * 3 / 4, -1);
    // bottom left corner curve
	arc(cubeSize, 0, -1, -1);
	// Cutout
    translate(v = [cubeSize / 4, cubeSize * 3 / 4, -1])
		cube(size = [cubeSize / 2, cubeSize / 4 + 1, cubeSize + 2]);
}

module carveLetterUAlt(cubeSize)
{
    // bottom right corner curve
	arc(cubeSize, 270, cubeSize * 3 / 4, -1);
    // bottom left corner curve
	arc(cubeSize, 0, -1, -1);
	// Cutout
    translate(v = [cubeSize / 2, cubeSize / 2, -1])
		cylinder(r = cubeSize / 4, h = cubeSize + 2,$fn = DETAIL);
    translate(v = [cubeSize / 4, cubeSize / 2, -1])
		cube(size = [cubeSize / 2, cubeSize / 2 + 1, cubeSize + 2]);
}

module carveLetterV(cubeSize)
{
	translate(v = [0, 0, -1])
		linear_extrude(height = cubeSize + 2, center = false, convexity = 3)
			polygon(points = [[-0.1, cubeSize * 3 / 8], [cubeSize * 3 / 8, -0.1], [-0.1, -0.1]], paths = [[0, 1, 2]], convexity = 3);
	translate(v = [0, 0, -1])
		linear_extrude(height = cubeSize + 2, center = false, convexity = 3)
			polygon(points = [[cubeSize * 5 / 8, - 0.1], [cubeSize + 0.1, cubeSize * 3 / 8 + 0.1], [cubeSize + 0.1, -0.1]], paths = [[0, 1, 2]], convexity = 3);
	translate(v = [0, 0, -1])
		linear_extrude(height = cubeSize + 2, center = false, convexity = 3)
			polygon(points = [[cubeSize / 4, cubeSize + 0.1], [cubeSize * 3 / 4, cubeSize + 0.1], [cubeSize / 2, cubeSize * 5 / 8]], paths = [[0, 1, 2]], convexity = 3);
}

module carveLetterW(cubeSize)
{
    // bottom right corner curve
	arc(cubeSize, 270, cubeSize * 3 / 4, -1);
    // bottom left corner curve
	arc(cubeSize, 0, -1, -1);
    // divot
	arcWithMargin(cubeSize, 270, 5, 0.1, cubeSize / 4 + 0.1, -5); // left
	arcWithMargin(cubeSize,   0, 0.1, 5, cubeSize / 2 - 0.1, -5); // right
	// Cutouts
    translate(v = [cubeSize / 4, cubeSize * 3 / 4, -1])
		cube(size = [cubeSize / 8, cubeSize / 4 + 1, cubeSize + 2]);
    translate(v = [cubeSize * 5 / 8, cubeSize * 3 / 4, -1])
		cube(size = [cubeSize / 8, cubeSize / 4 + 1, cubeSize + 2]);
}

module carveLetterX(cubeSize)
{
	translate(v = [cubeSize / 2, 0, -1])
		cylinder(r = cubeSize / 4, h = cubeSize + 2, $fn = DETAIL);
	translate(v = [0, cubeSize / 2, -1])
		cylinder(r = cubeSize / 4, h = cubeSize + 2, $fn = DETAIL);
	translate(v = [cubeSize / 2, cubeSize, -1])
		cylinder(r = cubeSize / 4, h = cubeSize + 2, $fn = DETAIL);
	translate(v = [cubeSize, cubeSize / 2, -1])
		cylinder(r = cubeSize / 4, h = cubeSize + 2, $fn = DETAIL);
}

module carveLetterY(cubeSize)
{
	translate(v = [cubeSize / 2, cubeSize, -1])
		cylinder(r = cubeSize / 4, h = cubeSize + 2, $fn = DETAIL);
	// right arc
	arcWithMargin(cubeSize, 270, 5, 5, cubeSize * 3 / 4, cubeSize / 2 - 5);
	// right cuout
	translate(v = [cubeSize * 3 / 4, -1, -1])
		cube(size = [cubeSize / 4 + 1, cubeSize / 2 + 1, cubeSize + 2]);
	// left arc
	arcWithMargin(cubeSize, 0, 5, 5, -5, cubeSize / 2 - 5);
	// left cuout
	translate(v = [-1, -1, -1])
		cube(size = [cubeSize / 4 + 1, cubeSize / 2 + 1, cubeSize + 2]);
}

module carveLetterYAlt(cubeSize)
{
	translate(v = [cubeSize / 2, cubeSize, -1])
		cylinder(r = cubeSize / 4, h = cubeSize + 2, $fn = DETAIL);
	// right arc
	arcWithMargin(cubeSize, 270, 5, 5, cubeSize * 3 / 4, cubeSize / 2 - 5);
	// right cuout
	translate(v = [cubeSize * 5 / 8, -1, -1])
		cube(size = [cubeSize * 3 / 8 + 1, cubeSize / 2 + 1, cubeSize + 2]);
	// left arc
	arcWithMargin(cubeSize, 0, 5, 5, -5, cubeSize / 2 - 5);
	// left cuout
	translate(v = [-1, -1, -1])
		cube(size = [cubeSize * 3 / 8 + 1, cubeSize / 2 + 1, cubeSize + 2]);
}

module carveLetterZ(cubeSize)
{
    // top right corner curve
	arc(cubeSize, 180, cubeSize * 3 / 4, cubeSize * 3 / 4 + 1);
    // bottom left corner curve
	arc(cubeSize, 0, -1, -1);
    // left
	arcWithMargin(cubeSize,  90, 0, 5, -5, cubeSize * 3 / 8);
	// right
	arcWithMargin(cubeSize, 270, 0, 5, cubeSize * 3 / 4, cubeSize * 3 / 8);
}

module carveLetter(typeface, theLetter, cubeSize)
{
	// Function pointers are fun
    if (theLetter == "A")
        carveLetterA(cubeSize);
    if (theLetter == "B")
        carveLetterB(cubeSize);
    if (theLetter == "C")
	{
		if (typeface == "alternate")
			carveLetterCAlt(cubeSize);
		else
        	carveLetterC(cubeSize);
	}
    if (theLetter == "D")
	{
		if (typeface == "alternate")
			carveLetterDAlt(cubeSize);
		else
        	carveLetterD(cubeSize);
	}
    if (theLetter == "E")
	{
		if (typeface == "alternate")
			carveLetterEAlt(cubeSize);
		else
        	carveLetterE(cubeSize);
	}
    if (theLetter == "F")
	{
		if (typeface == "alternate")
			carveLetterFAlt(cubeSize);
		else
        	carveLetterF(cubeSize);
	}
    if (theLetter == "G")
	{
		if (typeface == "alternate")
			carveLetterGAlt(cubeSize);
		else
        	carveLetterG(cubeSize);
	}
    if (theLetter == "H")
	{
		if (typeface == "alternate")
			carveLetterHAlt(cubeSize);
		else
        	carveLetterH(cubeSize);
	}
    if (theLetter == "I")
	{
		if (typeface == "alternate")
			carveLetterIAlt(cubeSize);
		else
        	carveLetterI(cubeSize);
	}
    if (theLetter == "J")
	{
		if (typeface == "alternate")
			carveLetterJAlt(cubeSize);
		else
        	carveLetterJ(cubeSize);
	}
    if (theLetter == "K")
	{
		if (typeface == "alternate")
			carveLetterKAlt(cubeSize);
		else
        	carveLetterK(cubeSize);
	}
    if (theLetter == "L")
	{
		if (typeface == "alternate")
			carveLetterLAlt(cubeSize);
		else
        	carveLetterL(cubeSize);
	}
    if (theLetter == "M")
        carveLetterM(cubeSize);
    if (theLetter == "N")
        carveLetterN(cubeSize);
    if (theLetter == "O")
	{
		if (typeface == "alternate")
			carveLetterOAlt(cubeSize);
		else
        	carveLetterO(cubeSize);
	}
    if (theLetter == "P")
	{
		if (typeface == "alternate")
			carveLetterPAlt(cubeSize);
		else
        	carveLetterP(cubeSize);
	}
    if (theLetter == "Q")
        carveLetterQ(cubeSize);
    if (theLetter == "R")
        carveLetterR(cubeSize);
    if (theLetter == "S")
        carveLetterS(cubeSize);
    if (theLetter == "T")
       	carveLetterT(cubeSize);
    if (theLetter == "U")
	{
		if (typeface == "alternate")
			carveLetterUAlt(cubeSize);
		else
        	carveLetterU(cubeSize);
	}
    if (theLetter == "V")
        carveLetterV(cubeSize);
    if (theLetter == "W")
        carveLetterW(cubeSize);
    if (theLetter == "X")
        carveLetterX(cubeSize);
    if (theLetter == "Y")
	{
		if (typeface == "alternate")
			carveLetterYAlt(cubeSize);
		else
        	carveLetterY(cubeSize);
	}
    if (theLetter == "Z")
        carveLetterZ(cubeSize);
}
// ----------------------------------------

module carveBlock(typeface, letter1, letter2, letter3)
{
	translate(v = [SIZE / -2, SIZE / -2, 0])
	    difference()
	    {
	        cube(size = [SIZE, SIZE, SIZE]);
	        // Top letter
	        carveLetter(typeface, letter3, SIZE);
	        // Front letter
	        translate(v = [0, SIZE, 0])
	            rotate(a = [90, 0, 0])
	                carveLetter(typeface, letter1, SIZE);
	        // Side letter
	        translate(v = [0, 0, 0])
	            rotate(a = [0, 90, 0])
	                rotate(a = [0, 0, 90])
	                    carveLetter(typeface, letter2, SIZE);
	    }
}

module test()
{
    difference()
    {
        cube(size = [SIZE, SIZE, SIZE]);
        // Top letter
        carveLetterFAlt(SIZE);
    }
}

carveBlock(typeface, left_side_letter, right_side_letter, top_letter);

// Test code:
//carveBlock(typeface, "B", "E", "A");
//carveBlock(typeface, "G", "E", "B");
//test();
